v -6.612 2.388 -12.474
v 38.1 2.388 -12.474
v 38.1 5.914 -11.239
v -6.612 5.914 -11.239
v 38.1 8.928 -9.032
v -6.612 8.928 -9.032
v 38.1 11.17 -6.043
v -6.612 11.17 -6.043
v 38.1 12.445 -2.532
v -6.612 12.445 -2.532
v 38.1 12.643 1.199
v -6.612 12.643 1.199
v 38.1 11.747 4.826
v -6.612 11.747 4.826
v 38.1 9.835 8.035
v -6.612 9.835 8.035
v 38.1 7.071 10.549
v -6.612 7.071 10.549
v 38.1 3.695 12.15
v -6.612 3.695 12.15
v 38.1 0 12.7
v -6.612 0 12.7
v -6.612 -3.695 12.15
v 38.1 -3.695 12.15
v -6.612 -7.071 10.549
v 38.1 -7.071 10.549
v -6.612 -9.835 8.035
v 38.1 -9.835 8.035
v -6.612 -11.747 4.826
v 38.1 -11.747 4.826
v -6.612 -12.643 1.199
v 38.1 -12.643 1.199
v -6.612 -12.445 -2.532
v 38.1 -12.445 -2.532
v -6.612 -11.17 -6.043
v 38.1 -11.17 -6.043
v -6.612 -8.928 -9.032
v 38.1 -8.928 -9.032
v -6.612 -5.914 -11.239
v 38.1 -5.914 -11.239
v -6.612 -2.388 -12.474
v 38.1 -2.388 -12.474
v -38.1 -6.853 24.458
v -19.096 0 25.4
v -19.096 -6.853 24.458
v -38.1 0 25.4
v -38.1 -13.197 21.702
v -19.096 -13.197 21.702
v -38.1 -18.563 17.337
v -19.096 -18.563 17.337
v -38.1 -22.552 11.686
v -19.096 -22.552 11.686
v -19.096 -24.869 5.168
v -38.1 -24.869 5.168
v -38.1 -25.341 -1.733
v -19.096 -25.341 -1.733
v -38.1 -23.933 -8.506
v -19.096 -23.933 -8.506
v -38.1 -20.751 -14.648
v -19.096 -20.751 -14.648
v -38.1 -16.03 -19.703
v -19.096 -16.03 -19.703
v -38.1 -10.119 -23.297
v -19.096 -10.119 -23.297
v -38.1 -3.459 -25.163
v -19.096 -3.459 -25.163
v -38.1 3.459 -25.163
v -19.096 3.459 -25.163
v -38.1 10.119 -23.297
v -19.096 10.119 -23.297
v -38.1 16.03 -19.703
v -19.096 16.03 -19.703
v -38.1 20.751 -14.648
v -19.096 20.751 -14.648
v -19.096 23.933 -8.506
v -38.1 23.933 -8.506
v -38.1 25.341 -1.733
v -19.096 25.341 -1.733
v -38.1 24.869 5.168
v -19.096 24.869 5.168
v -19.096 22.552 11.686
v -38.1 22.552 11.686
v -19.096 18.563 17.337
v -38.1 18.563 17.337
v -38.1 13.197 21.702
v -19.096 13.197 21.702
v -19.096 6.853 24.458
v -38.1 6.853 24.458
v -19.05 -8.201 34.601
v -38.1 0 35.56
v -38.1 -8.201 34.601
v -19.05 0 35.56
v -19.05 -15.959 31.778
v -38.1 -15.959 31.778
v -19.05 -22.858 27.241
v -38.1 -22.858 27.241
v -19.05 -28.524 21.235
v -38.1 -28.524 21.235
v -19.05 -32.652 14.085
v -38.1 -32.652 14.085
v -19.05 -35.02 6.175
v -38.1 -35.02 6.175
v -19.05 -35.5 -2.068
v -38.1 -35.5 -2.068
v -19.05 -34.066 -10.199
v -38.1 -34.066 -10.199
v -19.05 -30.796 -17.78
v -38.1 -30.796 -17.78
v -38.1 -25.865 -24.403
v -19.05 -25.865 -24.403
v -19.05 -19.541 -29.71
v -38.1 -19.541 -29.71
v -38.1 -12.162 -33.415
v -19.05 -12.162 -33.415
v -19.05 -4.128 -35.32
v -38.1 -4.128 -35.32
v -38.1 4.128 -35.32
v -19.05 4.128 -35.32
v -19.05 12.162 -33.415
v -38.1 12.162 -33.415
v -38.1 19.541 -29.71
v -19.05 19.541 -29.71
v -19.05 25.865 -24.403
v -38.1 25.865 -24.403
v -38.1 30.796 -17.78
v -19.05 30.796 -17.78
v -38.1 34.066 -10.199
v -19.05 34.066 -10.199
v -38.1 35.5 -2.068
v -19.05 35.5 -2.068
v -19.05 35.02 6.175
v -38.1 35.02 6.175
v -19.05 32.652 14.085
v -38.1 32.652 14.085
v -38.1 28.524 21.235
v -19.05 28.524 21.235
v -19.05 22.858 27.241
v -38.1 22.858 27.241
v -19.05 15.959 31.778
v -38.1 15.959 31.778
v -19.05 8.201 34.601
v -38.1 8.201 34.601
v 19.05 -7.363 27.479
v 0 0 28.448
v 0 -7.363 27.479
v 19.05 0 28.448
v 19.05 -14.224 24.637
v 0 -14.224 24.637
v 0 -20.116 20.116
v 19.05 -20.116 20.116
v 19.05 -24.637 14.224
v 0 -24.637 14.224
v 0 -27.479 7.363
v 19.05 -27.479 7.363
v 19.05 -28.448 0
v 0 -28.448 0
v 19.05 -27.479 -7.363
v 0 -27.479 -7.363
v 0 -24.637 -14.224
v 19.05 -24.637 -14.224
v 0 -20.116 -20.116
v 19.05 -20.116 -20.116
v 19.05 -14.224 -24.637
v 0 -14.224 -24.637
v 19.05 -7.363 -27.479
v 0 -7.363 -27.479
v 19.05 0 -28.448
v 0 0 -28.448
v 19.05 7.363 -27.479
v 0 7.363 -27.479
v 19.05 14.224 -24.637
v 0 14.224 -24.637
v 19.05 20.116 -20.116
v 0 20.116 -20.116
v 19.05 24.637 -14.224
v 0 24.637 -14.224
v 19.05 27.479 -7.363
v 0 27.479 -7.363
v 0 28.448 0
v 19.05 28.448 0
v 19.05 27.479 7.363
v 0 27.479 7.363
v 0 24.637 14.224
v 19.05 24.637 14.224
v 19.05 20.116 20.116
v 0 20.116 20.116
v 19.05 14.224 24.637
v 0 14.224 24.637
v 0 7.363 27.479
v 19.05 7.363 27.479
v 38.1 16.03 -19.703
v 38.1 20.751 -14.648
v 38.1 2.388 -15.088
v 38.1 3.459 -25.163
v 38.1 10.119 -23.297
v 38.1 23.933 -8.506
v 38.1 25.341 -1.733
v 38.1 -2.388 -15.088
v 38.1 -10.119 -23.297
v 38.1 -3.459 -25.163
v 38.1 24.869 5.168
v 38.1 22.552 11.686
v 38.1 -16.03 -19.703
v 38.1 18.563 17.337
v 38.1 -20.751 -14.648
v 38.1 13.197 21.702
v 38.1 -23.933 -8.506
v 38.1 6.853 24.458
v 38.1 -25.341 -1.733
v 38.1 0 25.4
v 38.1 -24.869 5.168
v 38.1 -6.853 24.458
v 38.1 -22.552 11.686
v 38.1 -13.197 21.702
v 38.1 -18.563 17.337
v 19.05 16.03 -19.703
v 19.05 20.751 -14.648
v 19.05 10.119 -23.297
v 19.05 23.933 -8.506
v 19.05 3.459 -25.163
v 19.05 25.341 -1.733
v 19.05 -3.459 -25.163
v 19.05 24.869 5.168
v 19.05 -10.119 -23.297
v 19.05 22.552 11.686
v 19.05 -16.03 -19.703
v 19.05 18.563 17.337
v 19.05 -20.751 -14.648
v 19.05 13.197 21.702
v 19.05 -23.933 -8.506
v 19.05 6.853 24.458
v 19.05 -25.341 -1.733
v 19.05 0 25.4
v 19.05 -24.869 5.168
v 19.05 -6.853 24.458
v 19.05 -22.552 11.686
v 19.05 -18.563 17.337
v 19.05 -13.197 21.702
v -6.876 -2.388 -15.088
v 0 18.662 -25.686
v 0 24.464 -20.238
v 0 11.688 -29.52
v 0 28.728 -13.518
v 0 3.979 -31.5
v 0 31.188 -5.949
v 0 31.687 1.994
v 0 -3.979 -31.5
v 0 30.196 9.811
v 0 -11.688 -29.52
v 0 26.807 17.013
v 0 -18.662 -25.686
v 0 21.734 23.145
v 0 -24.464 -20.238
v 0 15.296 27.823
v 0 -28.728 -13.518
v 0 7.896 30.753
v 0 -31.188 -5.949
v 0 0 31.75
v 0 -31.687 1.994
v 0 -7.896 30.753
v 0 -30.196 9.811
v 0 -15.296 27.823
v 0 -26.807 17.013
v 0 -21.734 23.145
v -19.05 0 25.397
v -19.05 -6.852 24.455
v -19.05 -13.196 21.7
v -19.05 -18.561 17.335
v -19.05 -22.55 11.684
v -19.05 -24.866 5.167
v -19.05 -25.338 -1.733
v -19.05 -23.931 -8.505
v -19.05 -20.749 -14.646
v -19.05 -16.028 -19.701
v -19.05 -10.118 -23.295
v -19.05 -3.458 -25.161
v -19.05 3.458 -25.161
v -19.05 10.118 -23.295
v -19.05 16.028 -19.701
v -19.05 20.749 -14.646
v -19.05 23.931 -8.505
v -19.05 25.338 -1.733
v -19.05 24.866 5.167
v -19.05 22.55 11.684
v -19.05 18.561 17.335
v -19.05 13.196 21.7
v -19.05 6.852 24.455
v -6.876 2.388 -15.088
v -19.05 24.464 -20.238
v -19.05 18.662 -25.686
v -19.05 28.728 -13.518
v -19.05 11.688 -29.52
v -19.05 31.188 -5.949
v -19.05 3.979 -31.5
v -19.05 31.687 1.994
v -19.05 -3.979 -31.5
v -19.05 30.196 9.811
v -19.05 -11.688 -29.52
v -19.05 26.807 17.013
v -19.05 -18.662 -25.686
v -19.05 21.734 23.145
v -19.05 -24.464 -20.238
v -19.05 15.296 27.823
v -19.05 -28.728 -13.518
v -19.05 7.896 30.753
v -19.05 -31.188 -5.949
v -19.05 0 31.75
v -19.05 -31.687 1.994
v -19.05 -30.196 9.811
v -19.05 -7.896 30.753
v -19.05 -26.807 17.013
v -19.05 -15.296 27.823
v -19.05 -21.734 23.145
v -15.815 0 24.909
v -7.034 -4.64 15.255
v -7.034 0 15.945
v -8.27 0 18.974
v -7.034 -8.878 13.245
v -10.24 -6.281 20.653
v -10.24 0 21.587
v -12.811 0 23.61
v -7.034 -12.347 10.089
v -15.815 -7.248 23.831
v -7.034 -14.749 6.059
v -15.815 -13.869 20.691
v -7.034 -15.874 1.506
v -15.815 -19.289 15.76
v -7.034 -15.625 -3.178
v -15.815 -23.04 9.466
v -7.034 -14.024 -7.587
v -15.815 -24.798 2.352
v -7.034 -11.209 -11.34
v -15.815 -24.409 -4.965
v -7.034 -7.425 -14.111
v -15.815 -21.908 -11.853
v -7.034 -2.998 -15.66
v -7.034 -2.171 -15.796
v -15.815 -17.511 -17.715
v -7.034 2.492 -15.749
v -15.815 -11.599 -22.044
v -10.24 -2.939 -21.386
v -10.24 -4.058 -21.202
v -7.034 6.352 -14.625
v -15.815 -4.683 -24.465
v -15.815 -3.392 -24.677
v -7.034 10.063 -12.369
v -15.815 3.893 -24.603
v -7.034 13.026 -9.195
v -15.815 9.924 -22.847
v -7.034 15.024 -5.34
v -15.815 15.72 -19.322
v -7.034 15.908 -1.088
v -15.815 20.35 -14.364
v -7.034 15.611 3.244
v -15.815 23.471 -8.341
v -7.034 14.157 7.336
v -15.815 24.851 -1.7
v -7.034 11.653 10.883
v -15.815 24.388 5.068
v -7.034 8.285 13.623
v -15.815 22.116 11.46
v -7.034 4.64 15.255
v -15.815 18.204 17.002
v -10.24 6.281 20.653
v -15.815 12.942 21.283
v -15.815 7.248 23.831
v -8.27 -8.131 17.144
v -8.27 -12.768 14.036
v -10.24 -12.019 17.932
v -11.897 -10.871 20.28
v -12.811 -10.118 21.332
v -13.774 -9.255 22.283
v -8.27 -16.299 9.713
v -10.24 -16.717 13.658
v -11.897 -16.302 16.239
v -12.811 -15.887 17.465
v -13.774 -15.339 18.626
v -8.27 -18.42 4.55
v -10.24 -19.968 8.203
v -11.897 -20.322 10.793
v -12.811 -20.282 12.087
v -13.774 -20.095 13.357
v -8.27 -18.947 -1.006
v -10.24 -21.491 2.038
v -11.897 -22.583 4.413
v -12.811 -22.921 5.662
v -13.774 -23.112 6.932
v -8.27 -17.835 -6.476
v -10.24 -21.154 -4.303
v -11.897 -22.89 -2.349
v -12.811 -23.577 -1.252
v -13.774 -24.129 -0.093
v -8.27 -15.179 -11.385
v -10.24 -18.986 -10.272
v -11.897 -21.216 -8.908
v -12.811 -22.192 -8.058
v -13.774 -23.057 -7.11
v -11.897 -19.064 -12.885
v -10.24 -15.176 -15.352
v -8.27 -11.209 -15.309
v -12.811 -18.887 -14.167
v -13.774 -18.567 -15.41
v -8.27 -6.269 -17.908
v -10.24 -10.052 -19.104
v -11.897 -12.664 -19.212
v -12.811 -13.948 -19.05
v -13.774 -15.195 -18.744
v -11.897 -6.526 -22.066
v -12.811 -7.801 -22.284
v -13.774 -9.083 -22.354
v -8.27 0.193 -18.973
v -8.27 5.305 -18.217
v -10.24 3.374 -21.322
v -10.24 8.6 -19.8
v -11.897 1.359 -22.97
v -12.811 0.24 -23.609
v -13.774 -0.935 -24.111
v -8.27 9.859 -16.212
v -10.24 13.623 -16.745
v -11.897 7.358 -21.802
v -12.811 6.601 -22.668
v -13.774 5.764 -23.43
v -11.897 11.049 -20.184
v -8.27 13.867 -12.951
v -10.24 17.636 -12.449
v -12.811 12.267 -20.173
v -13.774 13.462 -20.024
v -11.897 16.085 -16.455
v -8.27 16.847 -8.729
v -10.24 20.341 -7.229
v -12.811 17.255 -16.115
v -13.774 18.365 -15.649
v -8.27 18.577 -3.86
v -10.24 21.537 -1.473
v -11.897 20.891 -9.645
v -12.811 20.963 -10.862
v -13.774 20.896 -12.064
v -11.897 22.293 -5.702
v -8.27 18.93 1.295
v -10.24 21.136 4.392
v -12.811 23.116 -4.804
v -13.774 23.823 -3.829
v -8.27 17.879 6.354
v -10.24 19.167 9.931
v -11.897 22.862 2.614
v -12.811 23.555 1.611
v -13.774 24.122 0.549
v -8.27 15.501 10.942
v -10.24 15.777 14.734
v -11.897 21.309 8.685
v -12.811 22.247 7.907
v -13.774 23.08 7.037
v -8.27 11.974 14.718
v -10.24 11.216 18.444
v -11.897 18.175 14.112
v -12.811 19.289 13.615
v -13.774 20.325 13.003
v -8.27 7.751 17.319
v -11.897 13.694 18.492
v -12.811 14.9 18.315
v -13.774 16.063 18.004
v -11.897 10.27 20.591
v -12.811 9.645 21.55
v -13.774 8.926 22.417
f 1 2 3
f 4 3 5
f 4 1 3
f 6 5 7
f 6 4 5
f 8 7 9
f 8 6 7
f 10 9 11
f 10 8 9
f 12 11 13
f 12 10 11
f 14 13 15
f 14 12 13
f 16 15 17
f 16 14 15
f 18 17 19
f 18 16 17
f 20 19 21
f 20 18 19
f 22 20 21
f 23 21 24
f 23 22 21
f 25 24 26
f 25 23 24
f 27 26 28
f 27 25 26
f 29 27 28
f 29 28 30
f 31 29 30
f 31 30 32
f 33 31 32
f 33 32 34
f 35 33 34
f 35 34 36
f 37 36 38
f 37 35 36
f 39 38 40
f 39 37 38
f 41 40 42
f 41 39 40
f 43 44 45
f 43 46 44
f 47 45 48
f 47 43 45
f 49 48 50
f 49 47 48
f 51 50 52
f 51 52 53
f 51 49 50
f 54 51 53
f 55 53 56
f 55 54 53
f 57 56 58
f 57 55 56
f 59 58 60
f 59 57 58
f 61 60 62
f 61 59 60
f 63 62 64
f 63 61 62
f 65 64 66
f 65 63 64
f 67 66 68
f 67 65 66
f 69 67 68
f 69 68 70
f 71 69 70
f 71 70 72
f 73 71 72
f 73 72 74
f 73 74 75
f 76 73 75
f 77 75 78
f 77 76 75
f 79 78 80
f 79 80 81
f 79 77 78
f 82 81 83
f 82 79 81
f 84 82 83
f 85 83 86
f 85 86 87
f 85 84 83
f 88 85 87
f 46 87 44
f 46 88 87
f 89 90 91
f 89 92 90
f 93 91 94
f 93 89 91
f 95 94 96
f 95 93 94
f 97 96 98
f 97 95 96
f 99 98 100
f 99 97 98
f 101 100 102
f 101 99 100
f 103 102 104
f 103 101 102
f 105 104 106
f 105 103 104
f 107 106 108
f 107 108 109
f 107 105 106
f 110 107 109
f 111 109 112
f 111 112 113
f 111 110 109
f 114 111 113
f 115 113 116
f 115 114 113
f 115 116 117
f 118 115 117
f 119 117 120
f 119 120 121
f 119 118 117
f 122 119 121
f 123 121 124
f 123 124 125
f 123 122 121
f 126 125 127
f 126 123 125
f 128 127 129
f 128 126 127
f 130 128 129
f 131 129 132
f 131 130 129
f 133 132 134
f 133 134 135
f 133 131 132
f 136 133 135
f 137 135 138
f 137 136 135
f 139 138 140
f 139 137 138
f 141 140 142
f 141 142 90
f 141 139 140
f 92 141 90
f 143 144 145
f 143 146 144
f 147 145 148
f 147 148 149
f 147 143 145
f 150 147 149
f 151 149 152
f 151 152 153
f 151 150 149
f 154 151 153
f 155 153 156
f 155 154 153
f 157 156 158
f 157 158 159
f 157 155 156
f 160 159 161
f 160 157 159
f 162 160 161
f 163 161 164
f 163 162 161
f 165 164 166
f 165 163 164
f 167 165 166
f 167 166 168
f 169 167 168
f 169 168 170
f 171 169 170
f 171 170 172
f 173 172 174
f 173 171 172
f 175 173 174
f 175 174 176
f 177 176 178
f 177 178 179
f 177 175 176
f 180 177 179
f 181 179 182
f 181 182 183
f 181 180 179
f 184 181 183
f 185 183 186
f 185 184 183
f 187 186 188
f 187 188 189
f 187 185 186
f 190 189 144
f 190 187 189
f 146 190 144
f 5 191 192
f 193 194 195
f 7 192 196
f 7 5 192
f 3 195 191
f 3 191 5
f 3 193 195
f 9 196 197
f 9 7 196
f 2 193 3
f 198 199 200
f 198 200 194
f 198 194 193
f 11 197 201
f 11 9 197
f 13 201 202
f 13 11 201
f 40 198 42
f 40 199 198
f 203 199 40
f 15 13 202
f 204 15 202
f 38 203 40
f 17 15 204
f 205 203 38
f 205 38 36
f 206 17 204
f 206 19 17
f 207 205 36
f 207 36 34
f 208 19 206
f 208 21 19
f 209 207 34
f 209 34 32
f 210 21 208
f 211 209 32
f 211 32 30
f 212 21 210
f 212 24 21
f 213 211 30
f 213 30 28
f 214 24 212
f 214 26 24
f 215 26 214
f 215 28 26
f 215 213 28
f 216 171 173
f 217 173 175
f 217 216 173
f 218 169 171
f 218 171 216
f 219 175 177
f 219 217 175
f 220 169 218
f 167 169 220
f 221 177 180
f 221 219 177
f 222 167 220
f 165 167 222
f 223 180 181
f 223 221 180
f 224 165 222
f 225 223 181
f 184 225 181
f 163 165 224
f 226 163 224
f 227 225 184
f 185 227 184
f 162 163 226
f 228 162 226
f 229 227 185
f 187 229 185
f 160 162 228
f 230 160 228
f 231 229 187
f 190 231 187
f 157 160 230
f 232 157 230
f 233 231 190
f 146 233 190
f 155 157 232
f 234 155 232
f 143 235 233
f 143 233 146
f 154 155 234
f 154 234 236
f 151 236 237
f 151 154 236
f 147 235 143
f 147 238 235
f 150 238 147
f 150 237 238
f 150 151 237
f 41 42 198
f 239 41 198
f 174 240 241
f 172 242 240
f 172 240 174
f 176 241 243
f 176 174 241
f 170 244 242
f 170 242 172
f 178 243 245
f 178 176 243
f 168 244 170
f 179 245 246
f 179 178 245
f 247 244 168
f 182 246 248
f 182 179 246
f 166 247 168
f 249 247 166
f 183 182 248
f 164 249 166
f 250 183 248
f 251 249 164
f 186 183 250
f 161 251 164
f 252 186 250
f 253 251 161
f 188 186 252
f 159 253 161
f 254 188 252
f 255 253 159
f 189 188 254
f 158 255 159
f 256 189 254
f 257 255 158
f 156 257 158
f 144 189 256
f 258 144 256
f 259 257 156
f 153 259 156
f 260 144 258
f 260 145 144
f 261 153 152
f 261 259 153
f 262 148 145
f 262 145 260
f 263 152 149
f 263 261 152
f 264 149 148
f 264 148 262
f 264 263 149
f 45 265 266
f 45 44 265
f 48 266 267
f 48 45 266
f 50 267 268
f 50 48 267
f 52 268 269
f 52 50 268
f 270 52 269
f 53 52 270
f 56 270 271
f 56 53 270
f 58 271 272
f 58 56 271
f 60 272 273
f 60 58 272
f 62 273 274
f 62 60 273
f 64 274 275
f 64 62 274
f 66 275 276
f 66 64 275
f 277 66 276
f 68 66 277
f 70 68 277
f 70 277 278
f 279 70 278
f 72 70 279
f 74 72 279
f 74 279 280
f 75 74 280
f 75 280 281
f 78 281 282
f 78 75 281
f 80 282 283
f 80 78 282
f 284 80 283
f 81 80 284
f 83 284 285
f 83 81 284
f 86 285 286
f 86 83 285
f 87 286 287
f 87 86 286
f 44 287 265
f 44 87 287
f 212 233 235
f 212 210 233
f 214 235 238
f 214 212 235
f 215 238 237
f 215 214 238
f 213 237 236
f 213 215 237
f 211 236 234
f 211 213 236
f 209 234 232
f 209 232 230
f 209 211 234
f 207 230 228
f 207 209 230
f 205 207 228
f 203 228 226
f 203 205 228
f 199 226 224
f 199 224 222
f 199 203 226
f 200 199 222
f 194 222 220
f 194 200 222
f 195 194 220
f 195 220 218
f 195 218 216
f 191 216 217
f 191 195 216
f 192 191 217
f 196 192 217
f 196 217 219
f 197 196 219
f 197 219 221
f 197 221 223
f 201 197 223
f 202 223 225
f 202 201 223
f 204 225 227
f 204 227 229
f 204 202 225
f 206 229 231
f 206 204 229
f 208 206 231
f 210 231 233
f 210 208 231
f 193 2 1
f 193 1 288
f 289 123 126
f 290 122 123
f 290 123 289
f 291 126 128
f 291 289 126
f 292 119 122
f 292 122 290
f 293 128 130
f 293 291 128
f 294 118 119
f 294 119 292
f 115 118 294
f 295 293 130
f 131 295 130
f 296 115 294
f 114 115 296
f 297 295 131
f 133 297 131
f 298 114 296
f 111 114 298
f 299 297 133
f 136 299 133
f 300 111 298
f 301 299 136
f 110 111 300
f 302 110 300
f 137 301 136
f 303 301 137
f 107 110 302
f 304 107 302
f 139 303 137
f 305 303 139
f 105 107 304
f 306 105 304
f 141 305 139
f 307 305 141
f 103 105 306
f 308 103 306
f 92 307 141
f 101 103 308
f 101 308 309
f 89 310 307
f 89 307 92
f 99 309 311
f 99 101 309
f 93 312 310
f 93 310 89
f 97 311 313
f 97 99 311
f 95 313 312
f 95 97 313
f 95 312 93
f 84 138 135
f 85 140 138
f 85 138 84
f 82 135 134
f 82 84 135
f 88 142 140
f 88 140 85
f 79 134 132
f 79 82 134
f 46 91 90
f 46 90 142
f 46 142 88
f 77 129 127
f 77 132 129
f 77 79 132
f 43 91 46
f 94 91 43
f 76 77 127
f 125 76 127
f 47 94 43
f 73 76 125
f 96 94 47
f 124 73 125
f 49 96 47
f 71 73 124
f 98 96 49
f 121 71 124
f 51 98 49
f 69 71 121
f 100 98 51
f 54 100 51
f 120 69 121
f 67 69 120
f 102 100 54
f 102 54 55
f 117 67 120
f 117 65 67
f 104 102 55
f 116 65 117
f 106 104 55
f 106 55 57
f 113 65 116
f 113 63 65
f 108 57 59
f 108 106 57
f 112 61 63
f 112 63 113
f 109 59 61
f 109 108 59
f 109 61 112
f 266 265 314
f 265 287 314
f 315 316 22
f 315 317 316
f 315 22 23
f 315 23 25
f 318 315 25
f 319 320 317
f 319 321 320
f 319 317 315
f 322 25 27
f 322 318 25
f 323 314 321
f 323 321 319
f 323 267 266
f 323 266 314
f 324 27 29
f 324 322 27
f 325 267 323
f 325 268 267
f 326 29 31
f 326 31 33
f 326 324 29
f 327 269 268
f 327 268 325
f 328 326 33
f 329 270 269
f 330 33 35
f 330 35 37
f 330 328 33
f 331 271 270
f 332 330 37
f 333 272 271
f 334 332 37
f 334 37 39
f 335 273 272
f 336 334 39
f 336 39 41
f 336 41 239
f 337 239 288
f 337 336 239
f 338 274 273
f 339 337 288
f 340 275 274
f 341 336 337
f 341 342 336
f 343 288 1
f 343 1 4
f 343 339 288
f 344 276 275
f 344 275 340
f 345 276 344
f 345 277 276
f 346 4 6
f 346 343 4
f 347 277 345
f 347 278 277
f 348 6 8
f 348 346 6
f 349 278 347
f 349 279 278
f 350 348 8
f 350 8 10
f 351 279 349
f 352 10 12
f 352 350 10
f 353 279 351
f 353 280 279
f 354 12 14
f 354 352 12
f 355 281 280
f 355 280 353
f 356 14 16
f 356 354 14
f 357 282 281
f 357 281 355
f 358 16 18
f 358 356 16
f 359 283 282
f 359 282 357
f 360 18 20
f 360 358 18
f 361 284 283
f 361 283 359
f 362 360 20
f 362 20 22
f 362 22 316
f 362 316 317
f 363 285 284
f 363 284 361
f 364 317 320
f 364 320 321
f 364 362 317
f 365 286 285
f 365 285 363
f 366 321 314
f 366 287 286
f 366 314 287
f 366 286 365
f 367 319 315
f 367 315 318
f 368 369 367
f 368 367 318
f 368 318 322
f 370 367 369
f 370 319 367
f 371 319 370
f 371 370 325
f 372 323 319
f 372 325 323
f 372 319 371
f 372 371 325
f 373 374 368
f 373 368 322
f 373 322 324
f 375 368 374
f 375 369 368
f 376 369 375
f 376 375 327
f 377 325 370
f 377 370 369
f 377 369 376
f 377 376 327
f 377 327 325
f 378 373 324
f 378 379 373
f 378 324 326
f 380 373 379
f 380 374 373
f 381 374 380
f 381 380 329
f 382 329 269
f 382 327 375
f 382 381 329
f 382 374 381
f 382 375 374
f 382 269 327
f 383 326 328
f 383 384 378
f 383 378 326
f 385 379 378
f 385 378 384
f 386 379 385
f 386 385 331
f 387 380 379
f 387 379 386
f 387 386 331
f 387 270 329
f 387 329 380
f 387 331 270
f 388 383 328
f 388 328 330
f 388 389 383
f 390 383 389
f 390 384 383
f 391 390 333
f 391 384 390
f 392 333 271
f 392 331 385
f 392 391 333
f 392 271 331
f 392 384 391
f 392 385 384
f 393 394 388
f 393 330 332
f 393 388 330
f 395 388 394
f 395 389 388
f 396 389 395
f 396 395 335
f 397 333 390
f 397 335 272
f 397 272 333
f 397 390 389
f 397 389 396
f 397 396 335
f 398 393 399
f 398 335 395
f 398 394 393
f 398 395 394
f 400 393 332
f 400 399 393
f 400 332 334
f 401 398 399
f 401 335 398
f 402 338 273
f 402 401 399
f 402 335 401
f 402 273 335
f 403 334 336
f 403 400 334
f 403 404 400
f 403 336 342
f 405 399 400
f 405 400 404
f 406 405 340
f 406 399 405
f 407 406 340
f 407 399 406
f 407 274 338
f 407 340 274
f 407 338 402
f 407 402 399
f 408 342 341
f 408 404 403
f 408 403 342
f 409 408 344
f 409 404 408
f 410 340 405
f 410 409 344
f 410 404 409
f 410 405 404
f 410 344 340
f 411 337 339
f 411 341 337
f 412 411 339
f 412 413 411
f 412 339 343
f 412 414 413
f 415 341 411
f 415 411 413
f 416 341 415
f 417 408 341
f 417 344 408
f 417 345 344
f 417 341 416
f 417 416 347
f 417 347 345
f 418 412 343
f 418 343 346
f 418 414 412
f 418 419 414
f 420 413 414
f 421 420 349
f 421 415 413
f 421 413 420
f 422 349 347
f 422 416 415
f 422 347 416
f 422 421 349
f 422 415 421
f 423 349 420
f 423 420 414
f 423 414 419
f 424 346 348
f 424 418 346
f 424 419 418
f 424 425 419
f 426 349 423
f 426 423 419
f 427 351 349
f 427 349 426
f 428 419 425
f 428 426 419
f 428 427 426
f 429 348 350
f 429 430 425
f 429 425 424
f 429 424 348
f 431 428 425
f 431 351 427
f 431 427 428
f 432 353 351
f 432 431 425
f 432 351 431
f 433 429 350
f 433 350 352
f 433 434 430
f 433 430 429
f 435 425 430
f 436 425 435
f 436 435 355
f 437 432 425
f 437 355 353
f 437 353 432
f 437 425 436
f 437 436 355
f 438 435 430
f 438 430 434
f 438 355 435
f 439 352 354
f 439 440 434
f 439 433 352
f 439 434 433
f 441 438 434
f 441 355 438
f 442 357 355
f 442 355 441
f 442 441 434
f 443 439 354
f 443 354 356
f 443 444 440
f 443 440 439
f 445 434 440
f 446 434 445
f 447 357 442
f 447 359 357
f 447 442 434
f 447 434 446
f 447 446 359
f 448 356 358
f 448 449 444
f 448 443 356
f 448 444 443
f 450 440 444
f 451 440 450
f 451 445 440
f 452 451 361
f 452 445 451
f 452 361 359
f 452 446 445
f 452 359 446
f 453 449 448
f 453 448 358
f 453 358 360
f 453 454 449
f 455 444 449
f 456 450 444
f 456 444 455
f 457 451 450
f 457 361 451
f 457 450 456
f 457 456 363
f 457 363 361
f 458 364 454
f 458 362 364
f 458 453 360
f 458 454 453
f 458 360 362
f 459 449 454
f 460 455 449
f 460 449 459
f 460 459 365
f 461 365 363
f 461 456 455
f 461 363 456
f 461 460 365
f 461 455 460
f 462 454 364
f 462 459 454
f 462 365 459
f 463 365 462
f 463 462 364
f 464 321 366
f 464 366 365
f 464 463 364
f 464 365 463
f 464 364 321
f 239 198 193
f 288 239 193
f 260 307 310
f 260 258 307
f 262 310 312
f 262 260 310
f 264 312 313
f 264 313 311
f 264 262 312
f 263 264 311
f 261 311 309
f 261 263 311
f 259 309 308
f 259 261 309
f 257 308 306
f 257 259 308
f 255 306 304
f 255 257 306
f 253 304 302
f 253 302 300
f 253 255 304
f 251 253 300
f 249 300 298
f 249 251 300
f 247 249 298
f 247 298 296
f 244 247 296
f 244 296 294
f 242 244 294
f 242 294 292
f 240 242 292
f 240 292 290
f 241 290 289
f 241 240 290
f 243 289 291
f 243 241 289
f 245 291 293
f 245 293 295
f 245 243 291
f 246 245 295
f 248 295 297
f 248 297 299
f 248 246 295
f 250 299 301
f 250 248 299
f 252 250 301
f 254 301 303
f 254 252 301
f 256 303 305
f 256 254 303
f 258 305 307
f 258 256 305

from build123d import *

# Parameters (mm, degrees)
SKETCH3_W          = 4.7752
SKETCH3_H          = 4.7752
CUT_EXTRUDE1_DEPTH = 92.298779839


with BuildPart() as part:
    # Sketch1 → Revolve1 (revolve)
    with BuildSketch(Plane.XY, mode=Mode.PRIVATE) as revolve1_sk:
        with BuildLine():
            Line((-38.1, 35.56), (-19.05, 35.56))
            Line((-19.05, 35.56), (-19.05, 31.75))
            Line((-19.05, 31.75), (0, 31.75))
            Line((0, 31.75), (0, 28.448))
            Line((0, 28.448), (19.05, 28.448))
            Line((19.05, 28.448), (19.05, 25.4))
            Line((19.05, 25.4), (38.1, 25.4))
            Line((38.1, 25.4), (38.1, 12.7))
            Line((38.1, 12.7), (-6.61235224, 12.7))
            ThreePointArc((-6.61235224, 12.7), (-10.239814738, 21.587016556), (-19.05, 25.39728992))
            Line((-19.05, 25.39728992), (-19.096408435, 25.4))
            Line((-19.096408435, 25.4), (-38.1, 25.4))
            Line((-38.1, 25.4), (-38.1, 35.56))
        make_face()
    revolve(revolve1_sk.sketch.rotate(Axis((-38.1, 0, 0), (1, 0, 0)), 90), axis=Axis((-38.1, 0, 0), (1, 0, 0)))

    # Sketch3 → Cut-Extrude1 (cut, through all)
    with BuildSketch(Plane(origin=(38.1, 0, 0), x_dir=(0, 0, -1), z_dir=(1, 0, 0))):
        with Locations((12.7, 0)):
            Rectangle(SKETCH3_W, SKETCH3_H)
    extrude(amount=-CUT_EXTRUDE1_DEPTH, mode=Mode.SUBTRACT)


solid = part.part
